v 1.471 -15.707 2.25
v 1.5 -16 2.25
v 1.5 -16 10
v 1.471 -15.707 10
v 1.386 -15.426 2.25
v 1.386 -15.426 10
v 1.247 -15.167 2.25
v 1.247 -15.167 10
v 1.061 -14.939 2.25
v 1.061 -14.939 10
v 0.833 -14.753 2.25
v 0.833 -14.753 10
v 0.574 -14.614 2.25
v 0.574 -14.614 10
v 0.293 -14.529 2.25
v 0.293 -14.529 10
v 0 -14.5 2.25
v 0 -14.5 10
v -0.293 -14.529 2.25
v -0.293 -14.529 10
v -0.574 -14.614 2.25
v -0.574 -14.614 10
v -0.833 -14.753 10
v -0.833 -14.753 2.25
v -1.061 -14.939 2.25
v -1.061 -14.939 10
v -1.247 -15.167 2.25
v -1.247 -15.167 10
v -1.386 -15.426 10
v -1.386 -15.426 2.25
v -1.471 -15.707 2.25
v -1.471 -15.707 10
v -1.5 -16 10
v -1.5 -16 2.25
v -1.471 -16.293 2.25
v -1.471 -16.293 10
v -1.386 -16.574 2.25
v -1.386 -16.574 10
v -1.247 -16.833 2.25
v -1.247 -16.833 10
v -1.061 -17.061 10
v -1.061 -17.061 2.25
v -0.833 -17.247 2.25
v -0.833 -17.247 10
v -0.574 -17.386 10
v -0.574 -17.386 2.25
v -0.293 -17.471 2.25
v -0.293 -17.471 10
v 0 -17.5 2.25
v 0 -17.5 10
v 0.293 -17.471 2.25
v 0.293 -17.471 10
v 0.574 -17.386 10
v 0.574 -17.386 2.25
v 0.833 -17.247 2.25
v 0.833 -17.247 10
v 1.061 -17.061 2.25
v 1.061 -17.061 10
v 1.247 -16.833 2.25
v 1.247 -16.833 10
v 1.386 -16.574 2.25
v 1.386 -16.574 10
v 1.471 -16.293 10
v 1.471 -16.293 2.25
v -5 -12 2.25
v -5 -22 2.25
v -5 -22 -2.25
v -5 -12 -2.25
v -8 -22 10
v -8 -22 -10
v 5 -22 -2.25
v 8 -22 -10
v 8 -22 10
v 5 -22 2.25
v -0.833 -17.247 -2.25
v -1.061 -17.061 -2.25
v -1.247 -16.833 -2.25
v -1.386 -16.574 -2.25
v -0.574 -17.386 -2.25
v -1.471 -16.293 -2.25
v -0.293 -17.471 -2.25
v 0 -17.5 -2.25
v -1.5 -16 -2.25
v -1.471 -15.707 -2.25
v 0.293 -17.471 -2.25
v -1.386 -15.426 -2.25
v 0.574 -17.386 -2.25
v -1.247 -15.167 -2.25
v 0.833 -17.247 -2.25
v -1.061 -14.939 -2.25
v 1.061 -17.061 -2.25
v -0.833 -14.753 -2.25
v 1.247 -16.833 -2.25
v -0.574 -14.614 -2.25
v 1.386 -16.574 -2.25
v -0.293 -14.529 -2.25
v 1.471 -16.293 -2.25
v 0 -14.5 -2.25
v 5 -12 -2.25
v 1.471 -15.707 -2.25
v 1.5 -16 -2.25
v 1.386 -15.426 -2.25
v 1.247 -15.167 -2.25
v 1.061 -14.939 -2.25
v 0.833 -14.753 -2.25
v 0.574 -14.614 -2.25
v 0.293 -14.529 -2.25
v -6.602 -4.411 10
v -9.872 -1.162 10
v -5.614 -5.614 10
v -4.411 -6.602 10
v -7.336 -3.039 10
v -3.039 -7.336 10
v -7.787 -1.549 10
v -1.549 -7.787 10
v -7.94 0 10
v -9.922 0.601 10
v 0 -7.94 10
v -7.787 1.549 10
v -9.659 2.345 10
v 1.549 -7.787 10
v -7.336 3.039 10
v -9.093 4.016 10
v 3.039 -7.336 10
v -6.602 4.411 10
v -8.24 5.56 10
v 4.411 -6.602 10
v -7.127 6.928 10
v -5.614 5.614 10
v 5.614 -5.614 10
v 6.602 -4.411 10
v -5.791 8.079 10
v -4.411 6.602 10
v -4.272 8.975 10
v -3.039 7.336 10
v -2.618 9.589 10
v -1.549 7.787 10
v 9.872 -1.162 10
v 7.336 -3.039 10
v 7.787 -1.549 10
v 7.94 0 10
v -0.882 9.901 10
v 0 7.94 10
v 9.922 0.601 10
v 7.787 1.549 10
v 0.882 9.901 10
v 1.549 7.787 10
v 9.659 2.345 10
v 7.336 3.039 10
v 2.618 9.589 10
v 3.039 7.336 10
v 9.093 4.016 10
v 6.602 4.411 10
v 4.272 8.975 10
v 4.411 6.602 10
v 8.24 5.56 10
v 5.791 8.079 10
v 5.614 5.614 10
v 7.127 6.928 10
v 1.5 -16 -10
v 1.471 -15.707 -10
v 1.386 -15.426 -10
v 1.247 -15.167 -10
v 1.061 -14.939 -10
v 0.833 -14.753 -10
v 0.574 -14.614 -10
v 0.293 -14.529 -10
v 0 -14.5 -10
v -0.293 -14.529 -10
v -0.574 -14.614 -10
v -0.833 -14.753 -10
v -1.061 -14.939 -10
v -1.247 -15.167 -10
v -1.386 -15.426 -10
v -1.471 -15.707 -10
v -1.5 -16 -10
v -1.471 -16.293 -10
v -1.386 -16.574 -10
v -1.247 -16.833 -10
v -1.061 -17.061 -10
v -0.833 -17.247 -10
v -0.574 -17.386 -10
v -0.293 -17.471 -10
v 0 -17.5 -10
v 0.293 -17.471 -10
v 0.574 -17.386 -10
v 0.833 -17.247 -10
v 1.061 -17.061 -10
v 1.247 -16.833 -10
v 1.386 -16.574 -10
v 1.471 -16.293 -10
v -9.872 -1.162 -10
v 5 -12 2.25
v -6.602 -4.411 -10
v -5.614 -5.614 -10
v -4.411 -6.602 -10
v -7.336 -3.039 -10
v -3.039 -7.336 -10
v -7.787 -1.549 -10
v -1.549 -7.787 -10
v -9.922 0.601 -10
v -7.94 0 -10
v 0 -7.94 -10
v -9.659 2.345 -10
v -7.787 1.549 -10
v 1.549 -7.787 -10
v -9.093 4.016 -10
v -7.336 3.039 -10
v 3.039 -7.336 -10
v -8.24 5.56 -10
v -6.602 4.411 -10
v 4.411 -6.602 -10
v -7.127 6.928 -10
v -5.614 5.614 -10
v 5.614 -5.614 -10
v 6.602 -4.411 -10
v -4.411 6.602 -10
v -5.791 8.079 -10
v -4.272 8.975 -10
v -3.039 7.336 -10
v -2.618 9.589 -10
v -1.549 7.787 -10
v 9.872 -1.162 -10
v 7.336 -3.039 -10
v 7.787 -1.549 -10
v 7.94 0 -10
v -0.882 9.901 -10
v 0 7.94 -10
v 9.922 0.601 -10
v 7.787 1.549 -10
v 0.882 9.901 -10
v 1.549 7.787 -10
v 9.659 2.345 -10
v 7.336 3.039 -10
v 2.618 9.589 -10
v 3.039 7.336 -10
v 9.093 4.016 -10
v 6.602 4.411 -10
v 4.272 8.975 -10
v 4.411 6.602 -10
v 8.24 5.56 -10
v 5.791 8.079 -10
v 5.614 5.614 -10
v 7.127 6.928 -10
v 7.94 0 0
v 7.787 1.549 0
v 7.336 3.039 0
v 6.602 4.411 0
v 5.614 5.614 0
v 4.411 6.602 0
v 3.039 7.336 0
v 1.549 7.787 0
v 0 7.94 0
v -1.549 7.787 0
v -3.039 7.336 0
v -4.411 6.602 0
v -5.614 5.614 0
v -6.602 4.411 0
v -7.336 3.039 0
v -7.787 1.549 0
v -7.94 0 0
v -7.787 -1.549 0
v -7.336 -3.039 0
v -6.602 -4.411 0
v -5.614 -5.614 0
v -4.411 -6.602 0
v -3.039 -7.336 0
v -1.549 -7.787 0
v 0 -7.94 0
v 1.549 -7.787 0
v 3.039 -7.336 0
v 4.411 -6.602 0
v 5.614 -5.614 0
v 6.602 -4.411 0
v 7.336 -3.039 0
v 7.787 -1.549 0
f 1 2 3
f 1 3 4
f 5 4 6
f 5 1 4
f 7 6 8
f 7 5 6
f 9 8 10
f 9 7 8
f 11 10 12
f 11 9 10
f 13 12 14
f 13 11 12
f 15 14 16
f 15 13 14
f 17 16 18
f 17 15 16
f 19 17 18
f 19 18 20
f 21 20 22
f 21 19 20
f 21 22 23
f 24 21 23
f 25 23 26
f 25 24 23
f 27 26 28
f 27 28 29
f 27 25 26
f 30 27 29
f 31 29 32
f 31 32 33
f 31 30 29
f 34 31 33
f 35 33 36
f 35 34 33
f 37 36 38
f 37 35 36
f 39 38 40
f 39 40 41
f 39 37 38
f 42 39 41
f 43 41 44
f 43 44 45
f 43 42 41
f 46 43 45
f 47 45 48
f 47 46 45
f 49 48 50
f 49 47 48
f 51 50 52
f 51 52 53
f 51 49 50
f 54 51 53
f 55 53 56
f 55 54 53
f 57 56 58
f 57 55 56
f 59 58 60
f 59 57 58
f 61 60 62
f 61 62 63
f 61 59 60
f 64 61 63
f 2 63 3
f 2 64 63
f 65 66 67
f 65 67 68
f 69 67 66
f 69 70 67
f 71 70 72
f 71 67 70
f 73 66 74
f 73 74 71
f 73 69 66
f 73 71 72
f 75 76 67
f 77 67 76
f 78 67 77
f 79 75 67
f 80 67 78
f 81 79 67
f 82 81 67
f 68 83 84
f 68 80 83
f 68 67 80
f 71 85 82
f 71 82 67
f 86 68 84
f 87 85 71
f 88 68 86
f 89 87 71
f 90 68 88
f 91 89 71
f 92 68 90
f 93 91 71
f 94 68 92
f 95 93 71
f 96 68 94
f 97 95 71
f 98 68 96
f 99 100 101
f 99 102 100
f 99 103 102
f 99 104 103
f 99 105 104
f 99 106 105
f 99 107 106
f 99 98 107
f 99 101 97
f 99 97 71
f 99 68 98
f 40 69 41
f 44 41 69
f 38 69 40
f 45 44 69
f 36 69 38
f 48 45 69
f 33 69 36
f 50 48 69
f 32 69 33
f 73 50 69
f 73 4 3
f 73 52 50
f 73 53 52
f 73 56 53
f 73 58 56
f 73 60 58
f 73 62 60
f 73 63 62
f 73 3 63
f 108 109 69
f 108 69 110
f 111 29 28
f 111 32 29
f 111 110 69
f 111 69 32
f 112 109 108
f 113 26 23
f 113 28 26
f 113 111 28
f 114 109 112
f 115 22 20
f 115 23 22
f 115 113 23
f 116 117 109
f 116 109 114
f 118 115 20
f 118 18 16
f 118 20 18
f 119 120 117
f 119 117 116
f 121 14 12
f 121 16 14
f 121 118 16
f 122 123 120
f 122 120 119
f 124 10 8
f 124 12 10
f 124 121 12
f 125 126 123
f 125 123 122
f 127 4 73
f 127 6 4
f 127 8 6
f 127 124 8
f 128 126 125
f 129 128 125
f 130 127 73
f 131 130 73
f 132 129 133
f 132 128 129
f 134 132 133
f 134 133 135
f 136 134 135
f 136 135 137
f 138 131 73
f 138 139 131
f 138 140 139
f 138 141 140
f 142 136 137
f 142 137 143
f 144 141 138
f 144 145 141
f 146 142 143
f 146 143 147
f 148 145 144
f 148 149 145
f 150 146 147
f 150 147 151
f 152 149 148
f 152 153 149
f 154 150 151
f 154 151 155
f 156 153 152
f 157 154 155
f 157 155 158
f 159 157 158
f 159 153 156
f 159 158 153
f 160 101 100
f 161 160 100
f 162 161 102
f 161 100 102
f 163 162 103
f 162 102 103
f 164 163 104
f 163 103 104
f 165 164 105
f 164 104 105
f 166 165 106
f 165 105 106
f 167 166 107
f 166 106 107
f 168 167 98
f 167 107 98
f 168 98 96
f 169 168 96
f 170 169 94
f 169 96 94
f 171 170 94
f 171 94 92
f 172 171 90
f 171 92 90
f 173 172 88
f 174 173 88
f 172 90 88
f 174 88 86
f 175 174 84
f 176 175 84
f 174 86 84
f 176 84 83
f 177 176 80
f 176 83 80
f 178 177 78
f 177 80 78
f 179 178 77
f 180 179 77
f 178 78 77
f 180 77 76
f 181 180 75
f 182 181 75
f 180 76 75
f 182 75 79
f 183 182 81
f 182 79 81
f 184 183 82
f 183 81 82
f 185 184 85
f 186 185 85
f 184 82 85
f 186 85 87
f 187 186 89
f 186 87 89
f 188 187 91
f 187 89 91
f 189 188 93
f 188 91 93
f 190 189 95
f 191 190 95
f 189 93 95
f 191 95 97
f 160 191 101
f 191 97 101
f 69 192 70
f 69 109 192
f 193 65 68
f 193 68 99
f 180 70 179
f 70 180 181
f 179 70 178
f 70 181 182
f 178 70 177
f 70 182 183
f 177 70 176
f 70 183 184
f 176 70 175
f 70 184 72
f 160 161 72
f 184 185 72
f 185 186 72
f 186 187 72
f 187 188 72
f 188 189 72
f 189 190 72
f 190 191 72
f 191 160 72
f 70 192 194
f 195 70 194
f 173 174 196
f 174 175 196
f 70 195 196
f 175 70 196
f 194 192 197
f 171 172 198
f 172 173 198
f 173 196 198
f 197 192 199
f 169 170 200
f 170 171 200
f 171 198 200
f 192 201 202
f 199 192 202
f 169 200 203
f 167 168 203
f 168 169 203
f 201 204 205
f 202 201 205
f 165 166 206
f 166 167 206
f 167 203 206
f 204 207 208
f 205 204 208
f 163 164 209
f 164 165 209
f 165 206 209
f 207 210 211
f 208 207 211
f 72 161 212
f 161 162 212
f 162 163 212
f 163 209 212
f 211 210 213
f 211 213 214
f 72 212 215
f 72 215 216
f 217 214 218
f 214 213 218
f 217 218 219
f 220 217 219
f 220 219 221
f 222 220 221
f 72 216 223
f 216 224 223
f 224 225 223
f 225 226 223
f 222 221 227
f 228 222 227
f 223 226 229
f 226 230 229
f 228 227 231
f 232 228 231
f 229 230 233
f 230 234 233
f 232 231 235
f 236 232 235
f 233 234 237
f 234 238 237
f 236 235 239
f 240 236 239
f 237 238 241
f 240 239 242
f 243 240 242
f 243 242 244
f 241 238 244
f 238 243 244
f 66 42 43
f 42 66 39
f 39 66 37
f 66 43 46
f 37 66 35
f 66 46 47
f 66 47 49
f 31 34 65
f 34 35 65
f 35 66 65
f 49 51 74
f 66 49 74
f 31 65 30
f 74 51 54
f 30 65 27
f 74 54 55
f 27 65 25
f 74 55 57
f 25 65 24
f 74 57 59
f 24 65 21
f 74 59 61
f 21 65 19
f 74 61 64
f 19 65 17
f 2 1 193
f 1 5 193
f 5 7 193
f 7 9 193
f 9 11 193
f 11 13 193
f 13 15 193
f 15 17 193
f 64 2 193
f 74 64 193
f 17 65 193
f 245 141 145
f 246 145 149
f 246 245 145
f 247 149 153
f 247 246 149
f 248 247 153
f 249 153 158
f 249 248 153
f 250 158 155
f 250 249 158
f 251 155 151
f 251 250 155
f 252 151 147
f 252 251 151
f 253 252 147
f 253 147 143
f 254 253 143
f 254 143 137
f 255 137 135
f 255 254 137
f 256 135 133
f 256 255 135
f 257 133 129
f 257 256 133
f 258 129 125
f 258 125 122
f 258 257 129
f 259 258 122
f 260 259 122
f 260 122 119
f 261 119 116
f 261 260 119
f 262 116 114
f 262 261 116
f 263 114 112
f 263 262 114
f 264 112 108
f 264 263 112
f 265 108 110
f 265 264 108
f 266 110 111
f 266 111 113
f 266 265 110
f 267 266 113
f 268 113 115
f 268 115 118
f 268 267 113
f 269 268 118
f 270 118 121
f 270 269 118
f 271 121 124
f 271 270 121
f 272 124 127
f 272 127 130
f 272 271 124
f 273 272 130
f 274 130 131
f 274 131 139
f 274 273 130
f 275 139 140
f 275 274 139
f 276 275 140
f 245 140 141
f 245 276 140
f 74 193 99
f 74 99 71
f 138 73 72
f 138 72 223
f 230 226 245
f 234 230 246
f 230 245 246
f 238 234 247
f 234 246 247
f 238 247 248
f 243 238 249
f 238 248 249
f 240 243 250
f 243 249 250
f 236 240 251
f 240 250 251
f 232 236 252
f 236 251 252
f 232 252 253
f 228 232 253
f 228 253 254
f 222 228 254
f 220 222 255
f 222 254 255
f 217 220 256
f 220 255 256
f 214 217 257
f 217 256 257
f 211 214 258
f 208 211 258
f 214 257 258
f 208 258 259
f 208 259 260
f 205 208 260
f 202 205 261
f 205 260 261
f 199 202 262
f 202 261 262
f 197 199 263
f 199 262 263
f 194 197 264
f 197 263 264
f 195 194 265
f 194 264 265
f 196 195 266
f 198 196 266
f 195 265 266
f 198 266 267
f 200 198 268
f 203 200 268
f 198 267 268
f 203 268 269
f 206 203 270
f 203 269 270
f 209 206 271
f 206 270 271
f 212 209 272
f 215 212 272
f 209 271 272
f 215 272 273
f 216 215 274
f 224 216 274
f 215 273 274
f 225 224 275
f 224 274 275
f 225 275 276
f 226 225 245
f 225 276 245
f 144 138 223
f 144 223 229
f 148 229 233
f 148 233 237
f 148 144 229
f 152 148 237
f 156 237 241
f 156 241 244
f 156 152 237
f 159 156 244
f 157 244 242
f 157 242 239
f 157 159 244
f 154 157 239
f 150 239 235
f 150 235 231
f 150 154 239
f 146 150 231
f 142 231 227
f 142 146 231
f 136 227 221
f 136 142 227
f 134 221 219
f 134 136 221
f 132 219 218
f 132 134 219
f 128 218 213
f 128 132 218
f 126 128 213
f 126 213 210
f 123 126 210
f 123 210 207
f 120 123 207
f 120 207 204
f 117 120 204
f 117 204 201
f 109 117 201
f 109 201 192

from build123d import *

# Parameters (mm, degrees)
SKETCH1_R           = 7.94
BOSS_EXTRUDE1_DEPTH = 10
BOSS_EXTRUDE2_START = 2.25
SKETCH1_3_W         = 10
SKETCH1_3_H         = 10
SKETCH1_3_R         = 1.5
BOSS_EXTRUDE2_DEPTH = 7.75


with BuildPart() as part:
    # Sketch1 → Boss-Extrude1 (new body)
    with BuildSketch(Plane.XY):
        with BuildLine():
            Line((8, -22), (9.871863704, -1.161854982))
            ThreePointArc((9.871863704, -1.161854982), (0, 9.94), (-9.871863704, -1.161854982))
            Line((-9.871863704, -1.161854982), (-8, -22))
            Line((-8, -22), (-5, -22))
            Line((-5, -22), (-5, -12))
            Line((-5, -12), (5, -12))
            Line((5, -12), (5, -22))
            Line((5, -22), (8, -22))
        make_face()
        Circle(SKETCH1_R, mode=Mode.SUBTRACT)
    extrude(amount=BOSS_EXTRUDE1_DEPTH)

    # Sketch1<3> → Boss-Extrude2 (add)
    with BuildSketch(Plane.XY.offset(BOSS_EXTRUDE2_START)):
        with Locations((0, -17)):
            Rectangle(SKETCH1_3_W, SKETCH1_3_H)
        with Locations((0, -16)):
            Circle(SKETCH1_3_R, mode=Mode.SUBTRACT)
    extrude(amount=BOSS_EXTRUDE2_DEPTH)

    # Mirror1: part across plane


with BuildPart() as part_1:
    add(part.part)
    add(part.part.mirror(Plane.XY))


solid = part_1.part
